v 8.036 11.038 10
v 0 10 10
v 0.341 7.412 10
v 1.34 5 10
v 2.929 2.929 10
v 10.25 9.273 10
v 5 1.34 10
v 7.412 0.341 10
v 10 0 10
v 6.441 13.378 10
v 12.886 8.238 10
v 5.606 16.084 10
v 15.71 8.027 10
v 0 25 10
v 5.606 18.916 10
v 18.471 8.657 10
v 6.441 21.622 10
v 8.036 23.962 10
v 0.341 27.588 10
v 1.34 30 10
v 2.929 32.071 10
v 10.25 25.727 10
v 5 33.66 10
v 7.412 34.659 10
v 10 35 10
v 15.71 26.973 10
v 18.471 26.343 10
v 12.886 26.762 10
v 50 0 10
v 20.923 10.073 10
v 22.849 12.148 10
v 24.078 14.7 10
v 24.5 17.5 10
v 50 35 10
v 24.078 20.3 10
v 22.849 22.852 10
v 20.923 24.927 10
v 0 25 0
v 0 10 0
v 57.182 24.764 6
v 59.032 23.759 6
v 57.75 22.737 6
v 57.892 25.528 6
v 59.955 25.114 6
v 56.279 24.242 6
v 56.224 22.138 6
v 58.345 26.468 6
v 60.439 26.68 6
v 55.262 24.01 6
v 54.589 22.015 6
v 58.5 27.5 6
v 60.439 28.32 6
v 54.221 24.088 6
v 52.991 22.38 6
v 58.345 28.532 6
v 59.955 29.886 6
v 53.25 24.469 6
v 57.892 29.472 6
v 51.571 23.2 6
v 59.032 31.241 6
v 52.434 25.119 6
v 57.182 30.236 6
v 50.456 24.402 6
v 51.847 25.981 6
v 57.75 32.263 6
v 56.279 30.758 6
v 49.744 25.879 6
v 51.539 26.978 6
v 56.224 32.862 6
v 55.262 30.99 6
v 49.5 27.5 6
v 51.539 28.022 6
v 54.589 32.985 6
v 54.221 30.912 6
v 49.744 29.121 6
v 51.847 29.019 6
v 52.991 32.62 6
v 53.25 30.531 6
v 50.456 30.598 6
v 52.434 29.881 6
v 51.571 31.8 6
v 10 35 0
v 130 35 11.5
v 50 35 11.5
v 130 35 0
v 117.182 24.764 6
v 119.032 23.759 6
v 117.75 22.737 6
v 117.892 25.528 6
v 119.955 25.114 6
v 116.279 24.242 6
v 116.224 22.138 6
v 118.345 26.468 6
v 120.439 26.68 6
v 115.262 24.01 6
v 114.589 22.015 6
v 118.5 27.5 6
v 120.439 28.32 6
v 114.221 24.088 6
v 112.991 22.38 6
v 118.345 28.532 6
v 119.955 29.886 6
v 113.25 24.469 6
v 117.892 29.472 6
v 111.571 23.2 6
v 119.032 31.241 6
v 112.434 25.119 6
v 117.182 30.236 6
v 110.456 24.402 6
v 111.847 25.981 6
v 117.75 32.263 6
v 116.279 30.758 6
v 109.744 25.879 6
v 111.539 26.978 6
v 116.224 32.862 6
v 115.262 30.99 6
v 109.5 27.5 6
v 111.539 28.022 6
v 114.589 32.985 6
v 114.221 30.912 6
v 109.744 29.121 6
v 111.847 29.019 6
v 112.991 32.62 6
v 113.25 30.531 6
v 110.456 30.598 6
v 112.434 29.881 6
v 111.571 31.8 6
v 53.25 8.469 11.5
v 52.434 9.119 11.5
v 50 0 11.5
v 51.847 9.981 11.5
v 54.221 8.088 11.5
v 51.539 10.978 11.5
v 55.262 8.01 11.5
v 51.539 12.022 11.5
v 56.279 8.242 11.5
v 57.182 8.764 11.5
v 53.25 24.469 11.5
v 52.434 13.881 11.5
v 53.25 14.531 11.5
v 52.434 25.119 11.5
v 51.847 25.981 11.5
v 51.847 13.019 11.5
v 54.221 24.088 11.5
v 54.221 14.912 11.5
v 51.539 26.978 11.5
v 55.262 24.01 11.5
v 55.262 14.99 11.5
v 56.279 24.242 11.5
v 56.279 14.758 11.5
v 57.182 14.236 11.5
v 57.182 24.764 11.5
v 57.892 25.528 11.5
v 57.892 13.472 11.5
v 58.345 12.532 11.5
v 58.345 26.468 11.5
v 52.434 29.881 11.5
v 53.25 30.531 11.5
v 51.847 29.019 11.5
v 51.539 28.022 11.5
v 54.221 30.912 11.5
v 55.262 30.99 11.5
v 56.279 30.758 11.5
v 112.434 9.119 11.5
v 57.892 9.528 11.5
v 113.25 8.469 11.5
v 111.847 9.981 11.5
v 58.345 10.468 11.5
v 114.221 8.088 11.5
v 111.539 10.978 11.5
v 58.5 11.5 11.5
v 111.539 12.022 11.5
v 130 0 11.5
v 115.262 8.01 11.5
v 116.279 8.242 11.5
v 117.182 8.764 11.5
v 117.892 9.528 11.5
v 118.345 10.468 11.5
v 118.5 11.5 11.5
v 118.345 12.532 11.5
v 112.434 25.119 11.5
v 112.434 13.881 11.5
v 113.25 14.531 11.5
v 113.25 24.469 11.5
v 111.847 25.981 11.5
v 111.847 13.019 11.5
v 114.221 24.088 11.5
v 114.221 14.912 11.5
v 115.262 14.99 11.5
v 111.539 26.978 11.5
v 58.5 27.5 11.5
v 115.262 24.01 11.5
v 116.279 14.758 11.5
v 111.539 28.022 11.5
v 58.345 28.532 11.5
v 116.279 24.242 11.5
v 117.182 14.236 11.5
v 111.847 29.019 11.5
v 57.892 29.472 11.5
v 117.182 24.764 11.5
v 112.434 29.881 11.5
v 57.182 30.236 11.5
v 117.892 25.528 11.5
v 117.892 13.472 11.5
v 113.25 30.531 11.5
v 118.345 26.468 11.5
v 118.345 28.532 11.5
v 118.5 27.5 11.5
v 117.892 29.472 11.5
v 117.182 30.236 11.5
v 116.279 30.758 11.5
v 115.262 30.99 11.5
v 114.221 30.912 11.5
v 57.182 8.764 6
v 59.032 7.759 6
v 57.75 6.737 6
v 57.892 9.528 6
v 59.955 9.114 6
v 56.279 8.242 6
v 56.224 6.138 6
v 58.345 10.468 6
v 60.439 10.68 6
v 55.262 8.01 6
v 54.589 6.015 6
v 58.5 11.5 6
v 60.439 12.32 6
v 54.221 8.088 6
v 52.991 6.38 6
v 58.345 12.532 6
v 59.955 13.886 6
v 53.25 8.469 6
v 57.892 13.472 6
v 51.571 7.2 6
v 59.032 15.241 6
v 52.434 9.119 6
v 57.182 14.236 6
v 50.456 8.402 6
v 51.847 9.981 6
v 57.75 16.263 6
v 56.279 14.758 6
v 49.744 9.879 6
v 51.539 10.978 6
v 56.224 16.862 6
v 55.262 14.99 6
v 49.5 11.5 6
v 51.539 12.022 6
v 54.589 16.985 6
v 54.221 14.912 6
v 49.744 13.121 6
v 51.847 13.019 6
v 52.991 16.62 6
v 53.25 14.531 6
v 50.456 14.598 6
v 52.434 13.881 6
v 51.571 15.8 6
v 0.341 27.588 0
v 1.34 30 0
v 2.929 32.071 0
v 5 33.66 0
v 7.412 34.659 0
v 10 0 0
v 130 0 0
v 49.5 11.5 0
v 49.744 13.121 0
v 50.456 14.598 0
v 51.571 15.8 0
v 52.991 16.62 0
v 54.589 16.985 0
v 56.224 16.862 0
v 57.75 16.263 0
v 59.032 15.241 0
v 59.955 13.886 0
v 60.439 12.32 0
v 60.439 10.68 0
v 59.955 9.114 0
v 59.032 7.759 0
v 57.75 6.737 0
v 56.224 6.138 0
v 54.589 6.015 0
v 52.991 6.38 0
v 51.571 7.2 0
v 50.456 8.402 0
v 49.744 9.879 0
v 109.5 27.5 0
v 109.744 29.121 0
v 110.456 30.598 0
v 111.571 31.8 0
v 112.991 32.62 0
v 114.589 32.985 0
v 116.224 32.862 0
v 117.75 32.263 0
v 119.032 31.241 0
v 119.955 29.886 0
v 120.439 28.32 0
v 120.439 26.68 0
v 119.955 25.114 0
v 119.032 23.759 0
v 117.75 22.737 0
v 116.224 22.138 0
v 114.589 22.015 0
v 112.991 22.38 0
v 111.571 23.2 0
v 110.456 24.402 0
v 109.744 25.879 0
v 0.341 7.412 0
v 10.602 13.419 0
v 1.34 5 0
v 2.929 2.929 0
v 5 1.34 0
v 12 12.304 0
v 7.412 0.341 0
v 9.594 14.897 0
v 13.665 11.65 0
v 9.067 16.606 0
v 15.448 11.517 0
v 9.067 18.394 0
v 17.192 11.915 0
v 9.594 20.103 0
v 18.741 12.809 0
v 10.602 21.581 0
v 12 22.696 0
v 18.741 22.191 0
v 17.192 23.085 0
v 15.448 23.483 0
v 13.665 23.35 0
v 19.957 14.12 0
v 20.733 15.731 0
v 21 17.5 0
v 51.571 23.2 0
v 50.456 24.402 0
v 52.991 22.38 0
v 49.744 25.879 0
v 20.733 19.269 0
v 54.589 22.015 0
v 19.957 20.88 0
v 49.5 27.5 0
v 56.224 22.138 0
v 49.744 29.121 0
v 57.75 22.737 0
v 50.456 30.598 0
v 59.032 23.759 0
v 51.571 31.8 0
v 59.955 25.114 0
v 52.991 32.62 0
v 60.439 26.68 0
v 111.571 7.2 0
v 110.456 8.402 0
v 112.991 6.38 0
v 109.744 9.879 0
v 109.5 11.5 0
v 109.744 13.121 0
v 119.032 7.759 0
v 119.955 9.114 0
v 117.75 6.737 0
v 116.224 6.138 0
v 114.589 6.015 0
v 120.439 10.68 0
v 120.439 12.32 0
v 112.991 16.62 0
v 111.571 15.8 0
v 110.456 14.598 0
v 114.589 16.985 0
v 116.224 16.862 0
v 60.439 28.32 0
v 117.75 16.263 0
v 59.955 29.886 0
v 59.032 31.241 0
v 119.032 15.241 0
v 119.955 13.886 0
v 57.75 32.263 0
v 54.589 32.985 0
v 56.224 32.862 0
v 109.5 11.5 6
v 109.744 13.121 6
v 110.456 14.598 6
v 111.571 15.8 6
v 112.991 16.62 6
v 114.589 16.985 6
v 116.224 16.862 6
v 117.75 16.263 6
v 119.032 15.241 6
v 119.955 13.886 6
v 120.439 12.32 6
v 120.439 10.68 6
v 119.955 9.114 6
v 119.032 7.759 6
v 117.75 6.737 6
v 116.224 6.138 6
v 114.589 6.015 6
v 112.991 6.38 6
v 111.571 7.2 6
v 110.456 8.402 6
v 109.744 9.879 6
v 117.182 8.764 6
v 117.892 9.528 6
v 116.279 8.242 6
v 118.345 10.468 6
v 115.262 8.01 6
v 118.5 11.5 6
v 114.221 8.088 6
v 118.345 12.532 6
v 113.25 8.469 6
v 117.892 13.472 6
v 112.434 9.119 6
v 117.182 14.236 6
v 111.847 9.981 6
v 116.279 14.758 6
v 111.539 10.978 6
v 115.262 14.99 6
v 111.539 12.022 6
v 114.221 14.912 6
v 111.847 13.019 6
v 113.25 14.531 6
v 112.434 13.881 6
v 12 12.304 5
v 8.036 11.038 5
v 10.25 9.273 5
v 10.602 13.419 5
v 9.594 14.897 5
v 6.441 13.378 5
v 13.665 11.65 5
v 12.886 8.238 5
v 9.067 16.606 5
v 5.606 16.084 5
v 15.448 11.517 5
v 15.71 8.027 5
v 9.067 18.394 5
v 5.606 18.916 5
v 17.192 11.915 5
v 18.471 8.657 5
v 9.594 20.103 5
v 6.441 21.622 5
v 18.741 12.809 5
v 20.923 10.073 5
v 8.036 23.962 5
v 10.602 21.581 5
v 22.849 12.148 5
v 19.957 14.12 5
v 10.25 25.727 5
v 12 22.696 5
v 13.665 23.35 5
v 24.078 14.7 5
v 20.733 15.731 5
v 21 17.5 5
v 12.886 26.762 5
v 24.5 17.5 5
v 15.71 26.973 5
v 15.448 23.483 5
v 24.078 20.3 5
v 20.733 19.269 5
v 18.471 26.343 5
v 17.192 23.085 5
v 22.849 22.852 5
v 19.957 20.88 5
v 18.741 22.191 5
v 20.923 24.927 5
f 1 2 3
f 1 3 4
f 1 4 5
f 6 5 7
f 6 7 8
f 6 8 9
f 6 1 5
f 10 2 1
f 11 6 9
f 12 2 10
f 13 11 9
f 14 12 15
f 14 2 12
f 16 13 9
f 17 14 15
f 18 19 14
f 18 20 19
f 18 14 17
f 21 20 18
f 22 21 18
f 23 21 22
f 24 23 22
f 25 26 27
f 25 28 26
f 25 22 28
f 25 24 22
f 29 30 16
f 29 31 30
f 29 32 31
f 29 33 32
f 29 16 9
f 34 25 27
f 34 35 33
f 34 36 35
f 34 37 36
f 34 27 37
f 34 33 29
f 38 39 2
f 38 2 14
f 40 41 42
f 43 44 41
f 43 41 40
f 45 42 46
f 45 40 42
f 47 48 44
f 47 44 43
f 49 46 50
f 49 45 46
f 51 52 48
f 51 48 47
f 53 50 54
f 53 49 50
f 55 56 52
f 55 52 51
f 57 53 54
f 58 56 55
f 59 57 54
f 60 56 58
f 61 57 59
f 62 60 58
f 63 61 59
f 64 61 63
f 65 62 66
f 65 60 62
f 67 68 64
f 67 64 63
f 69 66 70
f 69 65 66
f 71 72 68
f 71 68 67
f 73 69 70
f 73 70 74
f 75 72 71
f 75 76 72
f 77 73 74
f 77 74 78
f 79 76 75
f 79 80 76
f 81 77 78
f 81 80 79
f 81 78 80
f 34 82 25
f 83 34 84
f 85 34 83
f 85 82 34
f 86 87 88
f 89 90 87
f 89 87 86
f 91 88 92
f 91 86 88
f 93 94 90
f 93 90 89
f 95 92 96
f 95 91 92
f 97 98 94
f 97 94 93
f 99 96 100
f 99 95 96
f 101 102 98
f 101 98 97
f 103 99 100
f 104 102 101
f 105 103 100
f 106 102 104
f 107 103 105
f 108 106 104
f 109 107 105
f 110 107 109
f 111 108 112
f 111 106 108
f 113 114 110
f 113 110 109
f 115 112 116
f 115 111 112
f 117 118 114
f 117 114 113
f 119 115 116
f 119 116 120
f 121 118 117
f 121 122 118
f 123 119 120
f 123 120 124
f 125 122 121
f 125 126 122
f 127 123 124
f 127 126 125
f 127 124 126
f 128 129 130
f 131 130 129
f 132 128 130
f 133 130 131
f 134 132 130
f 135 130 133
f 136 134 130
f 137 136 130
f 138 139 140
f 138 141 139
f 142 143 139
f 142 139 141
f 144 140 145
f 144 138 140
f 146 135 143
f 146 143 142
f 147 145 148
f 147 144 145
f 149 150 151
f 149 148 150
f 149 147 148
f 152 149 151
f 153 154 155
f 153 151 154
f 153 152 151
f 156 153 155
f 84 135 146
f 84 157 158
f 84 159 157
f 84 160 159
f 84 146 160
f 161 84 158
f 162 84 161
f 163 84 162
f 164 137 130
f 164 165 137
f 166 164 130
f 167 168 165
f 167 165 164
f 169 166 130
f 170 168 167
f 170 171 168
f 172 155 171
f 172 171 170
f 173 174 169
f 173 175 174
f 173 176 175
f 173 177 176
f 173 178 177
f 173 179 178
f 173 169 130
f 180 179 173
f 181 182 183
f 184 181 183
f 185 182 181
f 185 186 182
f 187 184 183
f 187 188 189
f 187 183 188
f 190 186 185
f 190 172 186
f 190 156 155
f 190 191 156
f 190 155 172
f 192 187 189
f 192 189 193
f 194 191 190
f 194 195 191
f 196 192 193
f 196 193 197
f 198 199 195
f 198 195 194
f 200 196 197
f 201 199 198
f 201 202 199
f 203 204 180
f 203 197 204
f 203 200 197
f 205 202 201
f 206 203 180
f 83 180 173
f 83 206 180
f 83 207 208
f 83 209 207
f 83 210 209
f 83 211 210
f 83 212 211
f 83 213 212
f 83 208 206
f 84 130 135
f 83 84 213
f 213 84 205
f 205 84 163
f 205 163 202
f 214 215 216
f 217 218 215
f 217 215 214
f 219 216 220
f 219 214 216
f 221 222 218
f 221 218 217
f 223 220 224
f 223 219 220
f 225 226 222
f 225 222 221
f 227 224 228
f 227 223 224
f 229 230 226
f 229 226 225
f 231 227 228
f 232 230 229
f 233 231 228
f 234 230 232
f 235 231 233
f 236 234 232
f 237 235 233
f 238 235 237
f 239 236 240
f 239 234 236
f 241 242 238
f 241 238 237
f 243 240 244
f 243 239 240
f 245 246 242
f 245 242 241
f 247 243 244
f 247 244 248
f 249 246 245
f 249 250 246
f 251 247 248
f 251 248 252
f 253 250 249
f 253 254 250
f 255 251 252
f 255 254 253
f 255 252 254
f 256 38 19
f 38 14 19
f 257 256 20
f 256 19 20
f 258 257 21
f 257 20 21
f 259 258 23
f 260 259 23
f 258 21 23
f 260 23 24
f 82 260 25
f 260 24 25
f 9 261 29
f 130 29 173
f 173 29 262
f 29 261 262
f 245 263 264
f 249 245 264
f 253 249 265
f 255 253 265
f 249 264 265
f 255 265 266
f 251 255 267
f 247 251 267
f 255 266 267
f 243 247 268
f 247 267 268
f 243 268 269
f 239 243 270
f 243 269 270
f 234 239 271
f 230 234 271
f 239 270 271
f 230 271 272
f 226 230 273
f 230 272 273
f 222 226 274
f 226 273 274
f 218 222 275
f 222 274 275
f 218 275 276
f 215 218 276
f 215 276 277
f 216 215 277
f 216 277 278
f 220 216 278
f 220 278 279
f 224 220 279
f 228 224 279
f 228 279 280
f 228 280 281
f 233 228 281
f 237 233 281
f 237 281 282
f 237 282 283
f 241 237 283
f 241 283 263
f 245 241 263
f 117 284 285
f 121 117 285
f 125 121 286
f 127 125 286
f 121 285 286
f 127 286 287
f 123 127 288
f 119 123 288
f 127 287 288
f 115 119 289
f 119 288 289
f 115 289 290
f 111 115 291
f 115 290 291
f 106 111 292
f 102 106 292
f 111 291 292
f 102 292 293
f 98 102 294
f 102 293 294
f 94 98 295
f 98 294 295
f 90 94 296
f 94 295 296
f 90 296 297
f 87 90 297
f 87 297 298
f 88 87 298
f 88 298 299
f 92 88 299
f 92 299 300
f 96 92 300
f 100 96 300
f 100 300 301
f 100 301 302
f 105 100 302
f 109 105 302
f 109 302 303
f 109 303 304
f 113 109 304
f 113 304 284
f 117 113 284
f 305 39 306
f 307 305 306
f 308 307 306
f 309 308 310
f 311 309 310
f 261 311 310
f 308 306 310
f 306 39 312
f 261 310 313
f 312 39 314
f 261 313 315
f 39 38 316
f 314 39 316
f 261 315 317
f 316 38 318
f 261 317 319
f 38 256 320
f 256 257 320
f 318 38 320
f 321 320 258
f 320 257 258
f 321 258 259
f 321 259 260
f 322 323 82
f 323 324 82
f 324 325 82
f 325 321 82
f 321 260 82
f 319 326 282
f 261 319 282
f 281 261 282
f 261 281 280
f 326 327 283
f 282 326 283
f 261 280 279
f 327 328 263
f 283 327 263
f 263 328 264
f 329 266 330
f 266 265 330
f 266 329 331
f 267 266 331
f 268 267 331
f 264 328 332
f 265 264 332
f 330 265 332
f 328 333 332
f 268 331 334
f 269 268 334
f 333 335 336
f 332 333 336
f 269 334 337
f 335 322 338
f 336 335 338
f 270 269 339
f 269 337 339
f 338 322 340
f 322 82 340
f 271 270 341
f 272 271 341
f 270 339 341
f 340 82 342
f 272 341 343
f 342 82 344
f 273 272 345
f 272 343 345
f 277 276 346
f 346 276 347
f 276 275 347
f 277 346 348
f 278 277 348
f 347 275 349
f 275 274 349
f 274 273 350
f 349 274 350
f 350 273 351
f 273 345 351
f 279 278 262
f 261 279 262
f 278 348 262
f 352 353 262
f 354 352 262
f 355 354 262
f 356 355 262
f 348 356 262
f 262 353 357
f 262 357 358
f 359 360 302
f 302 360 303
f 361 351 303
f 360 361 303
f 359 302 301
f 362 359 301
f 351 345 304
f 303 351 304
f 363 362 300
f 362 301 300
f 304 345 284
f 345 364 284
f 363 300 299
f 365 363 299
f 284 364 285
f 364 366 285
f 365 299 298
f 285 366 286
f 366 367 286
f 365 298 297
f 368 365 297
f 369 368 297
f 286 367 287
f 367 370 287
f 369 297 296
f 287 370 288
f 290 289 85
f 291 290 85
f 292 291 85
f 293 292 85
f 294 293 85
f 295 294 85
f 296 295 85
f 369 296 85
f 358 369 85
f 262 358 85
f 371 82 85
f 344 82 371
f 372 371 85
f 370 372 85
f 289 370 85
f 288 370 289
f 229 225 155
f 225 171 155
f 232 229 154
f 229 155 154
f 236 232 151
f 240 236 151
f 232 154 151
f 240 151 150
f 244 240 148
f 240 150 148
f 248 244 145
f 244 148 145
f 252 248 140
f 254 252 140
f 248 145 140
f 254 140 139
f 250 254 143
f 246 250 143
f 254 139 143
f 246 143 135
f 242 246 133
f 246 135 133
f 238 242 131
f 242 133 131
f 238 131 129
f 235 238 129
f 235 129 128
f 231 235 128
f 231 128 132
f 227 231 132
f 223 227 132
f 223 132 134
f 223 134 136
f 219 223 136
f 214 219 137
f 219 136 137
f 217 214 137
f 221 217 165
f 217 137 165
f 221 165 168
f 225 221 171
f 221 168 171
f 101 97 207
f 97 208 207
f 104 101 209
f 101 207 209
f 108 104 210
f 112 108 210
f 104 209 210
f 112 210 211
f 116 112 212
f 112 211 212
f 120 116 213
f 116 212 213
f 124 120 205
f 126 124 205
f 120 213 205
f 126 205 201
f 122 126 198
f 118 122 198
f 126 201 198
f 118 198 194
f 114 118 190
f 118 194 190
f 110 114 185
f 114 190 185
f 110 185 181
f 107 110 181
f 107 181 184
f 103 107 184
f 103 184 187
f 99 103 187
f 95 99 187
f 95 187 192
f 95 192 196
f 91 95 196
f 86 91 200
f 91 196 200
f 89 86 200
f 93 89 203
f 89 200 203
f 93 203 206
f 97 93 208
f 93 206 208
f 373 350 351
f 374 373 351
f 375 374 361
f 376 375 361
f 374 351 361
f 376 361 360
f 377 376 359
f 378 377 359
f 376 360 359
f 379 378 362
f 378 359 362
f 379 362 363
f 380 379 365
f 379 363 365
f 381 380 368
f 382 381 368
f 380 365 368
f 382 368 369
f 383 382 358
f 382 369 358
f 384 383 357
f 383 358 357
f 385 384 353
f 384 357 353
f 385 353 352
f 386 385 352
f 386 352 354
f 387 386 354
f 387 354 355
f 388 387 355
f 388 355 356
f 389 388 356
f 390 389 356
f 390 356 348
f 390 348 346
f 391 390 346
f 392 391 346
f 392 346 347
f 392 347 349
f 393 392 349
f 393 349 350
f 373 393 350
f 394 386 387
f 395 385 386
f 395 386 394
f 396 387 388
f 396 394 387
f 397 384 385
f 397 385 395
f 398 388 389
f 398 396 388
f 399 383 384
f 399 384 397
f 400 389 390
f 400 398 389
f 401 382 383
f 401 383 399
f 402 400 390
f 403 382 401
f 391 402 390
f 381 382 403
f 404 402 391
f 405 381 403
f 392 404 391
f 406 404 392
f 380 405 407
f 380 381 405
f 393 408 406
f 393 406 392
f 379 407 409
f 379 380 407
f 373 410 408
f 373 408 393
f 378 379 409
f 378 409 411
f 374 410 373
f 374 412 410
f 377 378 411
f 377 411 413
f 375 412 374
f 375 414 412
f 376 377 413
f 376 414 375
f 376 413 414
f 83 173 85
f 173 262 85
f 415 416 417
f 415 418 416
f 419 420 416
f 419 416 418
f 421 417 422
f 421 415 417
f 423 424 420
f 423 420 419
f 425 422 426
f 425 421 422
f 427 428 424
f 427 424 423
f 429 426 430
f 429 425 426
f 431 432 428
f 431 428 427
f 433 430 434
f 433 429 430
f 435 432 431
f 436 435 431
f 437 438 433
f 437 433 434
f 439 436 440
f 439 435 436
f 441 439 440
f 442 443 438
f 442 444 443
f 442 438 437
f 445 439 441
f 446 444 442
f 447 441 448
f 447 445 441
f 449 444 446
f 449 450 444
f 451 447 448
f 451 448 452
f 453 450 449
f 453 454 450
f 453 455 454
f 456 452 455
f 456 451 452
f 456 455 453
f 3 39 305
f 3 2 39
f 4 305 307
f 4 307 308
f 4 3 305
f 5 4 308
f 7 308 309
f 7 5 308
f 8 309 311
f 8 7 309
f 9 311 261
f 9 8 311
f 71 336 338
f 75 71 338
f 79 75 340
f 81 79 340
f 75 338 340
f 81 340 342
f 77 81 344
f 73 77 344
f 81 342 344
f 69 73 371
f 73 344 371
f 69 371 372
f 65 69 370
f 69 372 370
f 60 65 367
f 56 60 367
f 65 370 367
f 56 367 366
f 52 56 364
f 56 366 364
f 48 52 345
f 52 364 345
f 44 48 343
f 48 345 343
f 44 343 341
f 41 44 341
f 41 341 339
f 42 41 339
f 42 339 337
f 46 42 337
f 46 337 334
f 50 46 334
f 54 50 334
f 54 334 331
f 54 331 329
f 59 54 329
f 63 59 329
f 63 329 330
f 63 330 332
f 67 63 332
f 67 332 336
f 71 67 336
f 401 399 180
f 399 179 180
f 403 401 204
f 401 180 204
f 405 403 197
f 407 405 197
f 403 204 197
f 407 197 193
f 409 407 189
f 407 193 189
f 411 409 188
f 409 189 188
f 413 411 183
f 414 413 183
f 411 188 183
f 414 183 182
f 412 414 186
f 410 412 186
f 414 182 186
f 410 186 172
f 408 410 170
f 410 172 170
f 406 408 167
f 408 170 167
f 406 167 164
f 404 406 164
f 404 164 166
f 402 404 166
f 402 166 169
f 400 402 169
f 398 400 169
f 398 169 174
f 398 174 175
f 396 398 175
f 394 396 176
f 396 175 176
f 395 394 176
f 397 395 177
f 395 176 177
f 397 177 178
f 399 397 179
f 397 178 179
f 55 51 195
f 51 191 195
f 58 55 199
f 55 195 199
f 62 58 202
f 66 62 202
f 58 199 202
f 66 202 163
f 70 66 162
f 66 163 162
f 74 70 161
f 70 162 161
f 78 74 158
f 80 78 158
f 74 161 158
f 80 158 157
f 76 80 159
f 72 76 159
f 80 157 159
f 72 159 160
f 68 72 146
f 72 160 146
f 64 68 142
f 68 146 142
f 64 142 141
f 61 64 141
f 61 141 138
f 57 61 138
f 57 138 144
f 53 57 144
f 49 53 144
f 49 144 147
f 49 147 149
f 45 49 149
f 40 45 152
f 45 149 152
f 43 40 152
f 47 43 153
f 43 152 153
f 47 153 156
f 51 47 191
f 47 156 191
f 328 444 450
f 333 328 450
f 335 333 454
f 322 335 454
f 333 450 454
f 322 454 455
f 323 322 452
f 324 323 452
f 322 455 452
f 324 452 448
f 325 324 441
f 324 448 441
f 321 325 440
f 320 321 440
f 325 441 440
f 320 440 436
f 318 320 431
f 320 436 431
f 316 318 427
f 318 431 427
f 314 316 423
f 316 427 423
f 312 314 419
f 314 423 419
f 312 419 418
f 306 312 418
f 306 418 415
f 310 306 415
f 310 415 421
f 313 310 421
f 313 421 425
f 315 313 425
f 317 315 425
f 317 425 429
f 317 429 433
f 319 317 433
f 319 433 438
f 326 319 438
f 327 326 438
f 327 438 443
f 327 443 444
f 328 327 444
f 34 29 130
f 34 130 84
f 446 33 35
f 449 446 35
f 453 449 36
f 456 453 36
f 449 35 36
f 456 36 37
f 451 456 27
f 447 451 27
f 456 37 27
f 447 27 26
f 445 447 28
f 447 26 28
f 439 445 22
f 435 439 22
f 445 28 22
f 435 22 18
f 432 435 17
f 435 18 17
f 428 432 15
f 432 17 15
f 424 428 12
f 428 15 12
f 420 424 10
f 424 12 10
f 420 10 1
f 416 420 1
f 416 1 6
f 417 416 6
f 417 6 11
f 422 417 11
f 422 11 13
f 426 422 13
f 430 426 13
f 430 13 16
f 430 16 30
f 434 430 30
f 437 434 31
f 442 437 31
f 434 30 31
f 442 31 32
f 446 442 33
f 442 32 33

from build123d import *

# Parameters (mm, degrees)
SKETCH_1_W                   = 130
SKETCH_1_H                   = 35
EXTRUDE_1_DEPTH              = 10
SKETCH_2_R                   = 9.5
CUT_EXTRUDE_1_DEPTH          = 5
SKETCH_3_R                   = 6
CUT_EXTRUDE_2_DEPTH          = 135.721935853
FILLET_1_R                   = 10
SKETCH_4_W                   = 80
SKETCH_4_H                   = 35
EXTRUDE_2_DEPTH              = 1.5
HOLE_WIZARD_M6_1_D           = 7
HOLE_WIZARD_M6_1_CBORE_D     = 11
HOLE_WIZARD_M6_1_CBORE_DEPTH = 6


with BuildPart() as part:
    # 草图1 → 凸台-拉伸1 (new body)
    with BuildSketch(Plane.XY):
        with Locations((65, 17.5)):
            Rectangle(SKETCH_1_W, SKETCH_1_H)
    extrude(amount=EXTRUDE_1_DEPTH)

    # 草图2 → 切除-拉伸1 (cut)
    with BuildSketch(Plane.XY.offset(10)):
        with Locations((15, 17.5)):
            Circle(SKETCH_2_R)
    extrude(amount=-CUT_EXTRUDE_1_DEPTH, mode=Mode.SUBTRACT)

    # 草图3 → 切除-拉伸2 (cut, through all)
    with BuildSketch(Plane.XY.offset(5)):
        with Locations((15, 17.5)):
            Circle(SKETCH_3_R)
    extrude(amount=-CUT_EXTRUDE_2_DEPTH, mode=Mode.SUBTRACT)

    # 圆角1
    fillet_1_edges = [part.edges().sort_by_distance(p)[0] for p in [
        (0, 35, 5),
        (0, 0, 5),
    ]]
    fillet(fillet_1_edges, radius=FILLET_1_R)

    # 草图4 → 凸台-拉伸2 (add)
    with BuildSketch(Plane.XY.offset(10)):
        with Locations((90, 17.5)):
            Rectangle(SKETCH_4_W, SKETCH_4_H)
    extrude(amount=EXTRUDE_2_DEPTH)

    # M6 六角凹头螺钉的柱形沉头孔1 (through all)
    with Locations(Plane(origin=(0, 0, 0), x_dir=(-1, 0, 0), z_dir=(0, 0, -1))):
        with Locations((-115, 11.5), (-115, 27.5), (-55, 27.5), (-55, 11.5)):
            CounterBoreHole(HOLE_WIZARD_M6_1_D / 2, HOLE_WIZARD_M6_1_CBORE_D / 2, HOLE_WIZARD_M6_1_CBORE_DEPTH)


solid = part.part
